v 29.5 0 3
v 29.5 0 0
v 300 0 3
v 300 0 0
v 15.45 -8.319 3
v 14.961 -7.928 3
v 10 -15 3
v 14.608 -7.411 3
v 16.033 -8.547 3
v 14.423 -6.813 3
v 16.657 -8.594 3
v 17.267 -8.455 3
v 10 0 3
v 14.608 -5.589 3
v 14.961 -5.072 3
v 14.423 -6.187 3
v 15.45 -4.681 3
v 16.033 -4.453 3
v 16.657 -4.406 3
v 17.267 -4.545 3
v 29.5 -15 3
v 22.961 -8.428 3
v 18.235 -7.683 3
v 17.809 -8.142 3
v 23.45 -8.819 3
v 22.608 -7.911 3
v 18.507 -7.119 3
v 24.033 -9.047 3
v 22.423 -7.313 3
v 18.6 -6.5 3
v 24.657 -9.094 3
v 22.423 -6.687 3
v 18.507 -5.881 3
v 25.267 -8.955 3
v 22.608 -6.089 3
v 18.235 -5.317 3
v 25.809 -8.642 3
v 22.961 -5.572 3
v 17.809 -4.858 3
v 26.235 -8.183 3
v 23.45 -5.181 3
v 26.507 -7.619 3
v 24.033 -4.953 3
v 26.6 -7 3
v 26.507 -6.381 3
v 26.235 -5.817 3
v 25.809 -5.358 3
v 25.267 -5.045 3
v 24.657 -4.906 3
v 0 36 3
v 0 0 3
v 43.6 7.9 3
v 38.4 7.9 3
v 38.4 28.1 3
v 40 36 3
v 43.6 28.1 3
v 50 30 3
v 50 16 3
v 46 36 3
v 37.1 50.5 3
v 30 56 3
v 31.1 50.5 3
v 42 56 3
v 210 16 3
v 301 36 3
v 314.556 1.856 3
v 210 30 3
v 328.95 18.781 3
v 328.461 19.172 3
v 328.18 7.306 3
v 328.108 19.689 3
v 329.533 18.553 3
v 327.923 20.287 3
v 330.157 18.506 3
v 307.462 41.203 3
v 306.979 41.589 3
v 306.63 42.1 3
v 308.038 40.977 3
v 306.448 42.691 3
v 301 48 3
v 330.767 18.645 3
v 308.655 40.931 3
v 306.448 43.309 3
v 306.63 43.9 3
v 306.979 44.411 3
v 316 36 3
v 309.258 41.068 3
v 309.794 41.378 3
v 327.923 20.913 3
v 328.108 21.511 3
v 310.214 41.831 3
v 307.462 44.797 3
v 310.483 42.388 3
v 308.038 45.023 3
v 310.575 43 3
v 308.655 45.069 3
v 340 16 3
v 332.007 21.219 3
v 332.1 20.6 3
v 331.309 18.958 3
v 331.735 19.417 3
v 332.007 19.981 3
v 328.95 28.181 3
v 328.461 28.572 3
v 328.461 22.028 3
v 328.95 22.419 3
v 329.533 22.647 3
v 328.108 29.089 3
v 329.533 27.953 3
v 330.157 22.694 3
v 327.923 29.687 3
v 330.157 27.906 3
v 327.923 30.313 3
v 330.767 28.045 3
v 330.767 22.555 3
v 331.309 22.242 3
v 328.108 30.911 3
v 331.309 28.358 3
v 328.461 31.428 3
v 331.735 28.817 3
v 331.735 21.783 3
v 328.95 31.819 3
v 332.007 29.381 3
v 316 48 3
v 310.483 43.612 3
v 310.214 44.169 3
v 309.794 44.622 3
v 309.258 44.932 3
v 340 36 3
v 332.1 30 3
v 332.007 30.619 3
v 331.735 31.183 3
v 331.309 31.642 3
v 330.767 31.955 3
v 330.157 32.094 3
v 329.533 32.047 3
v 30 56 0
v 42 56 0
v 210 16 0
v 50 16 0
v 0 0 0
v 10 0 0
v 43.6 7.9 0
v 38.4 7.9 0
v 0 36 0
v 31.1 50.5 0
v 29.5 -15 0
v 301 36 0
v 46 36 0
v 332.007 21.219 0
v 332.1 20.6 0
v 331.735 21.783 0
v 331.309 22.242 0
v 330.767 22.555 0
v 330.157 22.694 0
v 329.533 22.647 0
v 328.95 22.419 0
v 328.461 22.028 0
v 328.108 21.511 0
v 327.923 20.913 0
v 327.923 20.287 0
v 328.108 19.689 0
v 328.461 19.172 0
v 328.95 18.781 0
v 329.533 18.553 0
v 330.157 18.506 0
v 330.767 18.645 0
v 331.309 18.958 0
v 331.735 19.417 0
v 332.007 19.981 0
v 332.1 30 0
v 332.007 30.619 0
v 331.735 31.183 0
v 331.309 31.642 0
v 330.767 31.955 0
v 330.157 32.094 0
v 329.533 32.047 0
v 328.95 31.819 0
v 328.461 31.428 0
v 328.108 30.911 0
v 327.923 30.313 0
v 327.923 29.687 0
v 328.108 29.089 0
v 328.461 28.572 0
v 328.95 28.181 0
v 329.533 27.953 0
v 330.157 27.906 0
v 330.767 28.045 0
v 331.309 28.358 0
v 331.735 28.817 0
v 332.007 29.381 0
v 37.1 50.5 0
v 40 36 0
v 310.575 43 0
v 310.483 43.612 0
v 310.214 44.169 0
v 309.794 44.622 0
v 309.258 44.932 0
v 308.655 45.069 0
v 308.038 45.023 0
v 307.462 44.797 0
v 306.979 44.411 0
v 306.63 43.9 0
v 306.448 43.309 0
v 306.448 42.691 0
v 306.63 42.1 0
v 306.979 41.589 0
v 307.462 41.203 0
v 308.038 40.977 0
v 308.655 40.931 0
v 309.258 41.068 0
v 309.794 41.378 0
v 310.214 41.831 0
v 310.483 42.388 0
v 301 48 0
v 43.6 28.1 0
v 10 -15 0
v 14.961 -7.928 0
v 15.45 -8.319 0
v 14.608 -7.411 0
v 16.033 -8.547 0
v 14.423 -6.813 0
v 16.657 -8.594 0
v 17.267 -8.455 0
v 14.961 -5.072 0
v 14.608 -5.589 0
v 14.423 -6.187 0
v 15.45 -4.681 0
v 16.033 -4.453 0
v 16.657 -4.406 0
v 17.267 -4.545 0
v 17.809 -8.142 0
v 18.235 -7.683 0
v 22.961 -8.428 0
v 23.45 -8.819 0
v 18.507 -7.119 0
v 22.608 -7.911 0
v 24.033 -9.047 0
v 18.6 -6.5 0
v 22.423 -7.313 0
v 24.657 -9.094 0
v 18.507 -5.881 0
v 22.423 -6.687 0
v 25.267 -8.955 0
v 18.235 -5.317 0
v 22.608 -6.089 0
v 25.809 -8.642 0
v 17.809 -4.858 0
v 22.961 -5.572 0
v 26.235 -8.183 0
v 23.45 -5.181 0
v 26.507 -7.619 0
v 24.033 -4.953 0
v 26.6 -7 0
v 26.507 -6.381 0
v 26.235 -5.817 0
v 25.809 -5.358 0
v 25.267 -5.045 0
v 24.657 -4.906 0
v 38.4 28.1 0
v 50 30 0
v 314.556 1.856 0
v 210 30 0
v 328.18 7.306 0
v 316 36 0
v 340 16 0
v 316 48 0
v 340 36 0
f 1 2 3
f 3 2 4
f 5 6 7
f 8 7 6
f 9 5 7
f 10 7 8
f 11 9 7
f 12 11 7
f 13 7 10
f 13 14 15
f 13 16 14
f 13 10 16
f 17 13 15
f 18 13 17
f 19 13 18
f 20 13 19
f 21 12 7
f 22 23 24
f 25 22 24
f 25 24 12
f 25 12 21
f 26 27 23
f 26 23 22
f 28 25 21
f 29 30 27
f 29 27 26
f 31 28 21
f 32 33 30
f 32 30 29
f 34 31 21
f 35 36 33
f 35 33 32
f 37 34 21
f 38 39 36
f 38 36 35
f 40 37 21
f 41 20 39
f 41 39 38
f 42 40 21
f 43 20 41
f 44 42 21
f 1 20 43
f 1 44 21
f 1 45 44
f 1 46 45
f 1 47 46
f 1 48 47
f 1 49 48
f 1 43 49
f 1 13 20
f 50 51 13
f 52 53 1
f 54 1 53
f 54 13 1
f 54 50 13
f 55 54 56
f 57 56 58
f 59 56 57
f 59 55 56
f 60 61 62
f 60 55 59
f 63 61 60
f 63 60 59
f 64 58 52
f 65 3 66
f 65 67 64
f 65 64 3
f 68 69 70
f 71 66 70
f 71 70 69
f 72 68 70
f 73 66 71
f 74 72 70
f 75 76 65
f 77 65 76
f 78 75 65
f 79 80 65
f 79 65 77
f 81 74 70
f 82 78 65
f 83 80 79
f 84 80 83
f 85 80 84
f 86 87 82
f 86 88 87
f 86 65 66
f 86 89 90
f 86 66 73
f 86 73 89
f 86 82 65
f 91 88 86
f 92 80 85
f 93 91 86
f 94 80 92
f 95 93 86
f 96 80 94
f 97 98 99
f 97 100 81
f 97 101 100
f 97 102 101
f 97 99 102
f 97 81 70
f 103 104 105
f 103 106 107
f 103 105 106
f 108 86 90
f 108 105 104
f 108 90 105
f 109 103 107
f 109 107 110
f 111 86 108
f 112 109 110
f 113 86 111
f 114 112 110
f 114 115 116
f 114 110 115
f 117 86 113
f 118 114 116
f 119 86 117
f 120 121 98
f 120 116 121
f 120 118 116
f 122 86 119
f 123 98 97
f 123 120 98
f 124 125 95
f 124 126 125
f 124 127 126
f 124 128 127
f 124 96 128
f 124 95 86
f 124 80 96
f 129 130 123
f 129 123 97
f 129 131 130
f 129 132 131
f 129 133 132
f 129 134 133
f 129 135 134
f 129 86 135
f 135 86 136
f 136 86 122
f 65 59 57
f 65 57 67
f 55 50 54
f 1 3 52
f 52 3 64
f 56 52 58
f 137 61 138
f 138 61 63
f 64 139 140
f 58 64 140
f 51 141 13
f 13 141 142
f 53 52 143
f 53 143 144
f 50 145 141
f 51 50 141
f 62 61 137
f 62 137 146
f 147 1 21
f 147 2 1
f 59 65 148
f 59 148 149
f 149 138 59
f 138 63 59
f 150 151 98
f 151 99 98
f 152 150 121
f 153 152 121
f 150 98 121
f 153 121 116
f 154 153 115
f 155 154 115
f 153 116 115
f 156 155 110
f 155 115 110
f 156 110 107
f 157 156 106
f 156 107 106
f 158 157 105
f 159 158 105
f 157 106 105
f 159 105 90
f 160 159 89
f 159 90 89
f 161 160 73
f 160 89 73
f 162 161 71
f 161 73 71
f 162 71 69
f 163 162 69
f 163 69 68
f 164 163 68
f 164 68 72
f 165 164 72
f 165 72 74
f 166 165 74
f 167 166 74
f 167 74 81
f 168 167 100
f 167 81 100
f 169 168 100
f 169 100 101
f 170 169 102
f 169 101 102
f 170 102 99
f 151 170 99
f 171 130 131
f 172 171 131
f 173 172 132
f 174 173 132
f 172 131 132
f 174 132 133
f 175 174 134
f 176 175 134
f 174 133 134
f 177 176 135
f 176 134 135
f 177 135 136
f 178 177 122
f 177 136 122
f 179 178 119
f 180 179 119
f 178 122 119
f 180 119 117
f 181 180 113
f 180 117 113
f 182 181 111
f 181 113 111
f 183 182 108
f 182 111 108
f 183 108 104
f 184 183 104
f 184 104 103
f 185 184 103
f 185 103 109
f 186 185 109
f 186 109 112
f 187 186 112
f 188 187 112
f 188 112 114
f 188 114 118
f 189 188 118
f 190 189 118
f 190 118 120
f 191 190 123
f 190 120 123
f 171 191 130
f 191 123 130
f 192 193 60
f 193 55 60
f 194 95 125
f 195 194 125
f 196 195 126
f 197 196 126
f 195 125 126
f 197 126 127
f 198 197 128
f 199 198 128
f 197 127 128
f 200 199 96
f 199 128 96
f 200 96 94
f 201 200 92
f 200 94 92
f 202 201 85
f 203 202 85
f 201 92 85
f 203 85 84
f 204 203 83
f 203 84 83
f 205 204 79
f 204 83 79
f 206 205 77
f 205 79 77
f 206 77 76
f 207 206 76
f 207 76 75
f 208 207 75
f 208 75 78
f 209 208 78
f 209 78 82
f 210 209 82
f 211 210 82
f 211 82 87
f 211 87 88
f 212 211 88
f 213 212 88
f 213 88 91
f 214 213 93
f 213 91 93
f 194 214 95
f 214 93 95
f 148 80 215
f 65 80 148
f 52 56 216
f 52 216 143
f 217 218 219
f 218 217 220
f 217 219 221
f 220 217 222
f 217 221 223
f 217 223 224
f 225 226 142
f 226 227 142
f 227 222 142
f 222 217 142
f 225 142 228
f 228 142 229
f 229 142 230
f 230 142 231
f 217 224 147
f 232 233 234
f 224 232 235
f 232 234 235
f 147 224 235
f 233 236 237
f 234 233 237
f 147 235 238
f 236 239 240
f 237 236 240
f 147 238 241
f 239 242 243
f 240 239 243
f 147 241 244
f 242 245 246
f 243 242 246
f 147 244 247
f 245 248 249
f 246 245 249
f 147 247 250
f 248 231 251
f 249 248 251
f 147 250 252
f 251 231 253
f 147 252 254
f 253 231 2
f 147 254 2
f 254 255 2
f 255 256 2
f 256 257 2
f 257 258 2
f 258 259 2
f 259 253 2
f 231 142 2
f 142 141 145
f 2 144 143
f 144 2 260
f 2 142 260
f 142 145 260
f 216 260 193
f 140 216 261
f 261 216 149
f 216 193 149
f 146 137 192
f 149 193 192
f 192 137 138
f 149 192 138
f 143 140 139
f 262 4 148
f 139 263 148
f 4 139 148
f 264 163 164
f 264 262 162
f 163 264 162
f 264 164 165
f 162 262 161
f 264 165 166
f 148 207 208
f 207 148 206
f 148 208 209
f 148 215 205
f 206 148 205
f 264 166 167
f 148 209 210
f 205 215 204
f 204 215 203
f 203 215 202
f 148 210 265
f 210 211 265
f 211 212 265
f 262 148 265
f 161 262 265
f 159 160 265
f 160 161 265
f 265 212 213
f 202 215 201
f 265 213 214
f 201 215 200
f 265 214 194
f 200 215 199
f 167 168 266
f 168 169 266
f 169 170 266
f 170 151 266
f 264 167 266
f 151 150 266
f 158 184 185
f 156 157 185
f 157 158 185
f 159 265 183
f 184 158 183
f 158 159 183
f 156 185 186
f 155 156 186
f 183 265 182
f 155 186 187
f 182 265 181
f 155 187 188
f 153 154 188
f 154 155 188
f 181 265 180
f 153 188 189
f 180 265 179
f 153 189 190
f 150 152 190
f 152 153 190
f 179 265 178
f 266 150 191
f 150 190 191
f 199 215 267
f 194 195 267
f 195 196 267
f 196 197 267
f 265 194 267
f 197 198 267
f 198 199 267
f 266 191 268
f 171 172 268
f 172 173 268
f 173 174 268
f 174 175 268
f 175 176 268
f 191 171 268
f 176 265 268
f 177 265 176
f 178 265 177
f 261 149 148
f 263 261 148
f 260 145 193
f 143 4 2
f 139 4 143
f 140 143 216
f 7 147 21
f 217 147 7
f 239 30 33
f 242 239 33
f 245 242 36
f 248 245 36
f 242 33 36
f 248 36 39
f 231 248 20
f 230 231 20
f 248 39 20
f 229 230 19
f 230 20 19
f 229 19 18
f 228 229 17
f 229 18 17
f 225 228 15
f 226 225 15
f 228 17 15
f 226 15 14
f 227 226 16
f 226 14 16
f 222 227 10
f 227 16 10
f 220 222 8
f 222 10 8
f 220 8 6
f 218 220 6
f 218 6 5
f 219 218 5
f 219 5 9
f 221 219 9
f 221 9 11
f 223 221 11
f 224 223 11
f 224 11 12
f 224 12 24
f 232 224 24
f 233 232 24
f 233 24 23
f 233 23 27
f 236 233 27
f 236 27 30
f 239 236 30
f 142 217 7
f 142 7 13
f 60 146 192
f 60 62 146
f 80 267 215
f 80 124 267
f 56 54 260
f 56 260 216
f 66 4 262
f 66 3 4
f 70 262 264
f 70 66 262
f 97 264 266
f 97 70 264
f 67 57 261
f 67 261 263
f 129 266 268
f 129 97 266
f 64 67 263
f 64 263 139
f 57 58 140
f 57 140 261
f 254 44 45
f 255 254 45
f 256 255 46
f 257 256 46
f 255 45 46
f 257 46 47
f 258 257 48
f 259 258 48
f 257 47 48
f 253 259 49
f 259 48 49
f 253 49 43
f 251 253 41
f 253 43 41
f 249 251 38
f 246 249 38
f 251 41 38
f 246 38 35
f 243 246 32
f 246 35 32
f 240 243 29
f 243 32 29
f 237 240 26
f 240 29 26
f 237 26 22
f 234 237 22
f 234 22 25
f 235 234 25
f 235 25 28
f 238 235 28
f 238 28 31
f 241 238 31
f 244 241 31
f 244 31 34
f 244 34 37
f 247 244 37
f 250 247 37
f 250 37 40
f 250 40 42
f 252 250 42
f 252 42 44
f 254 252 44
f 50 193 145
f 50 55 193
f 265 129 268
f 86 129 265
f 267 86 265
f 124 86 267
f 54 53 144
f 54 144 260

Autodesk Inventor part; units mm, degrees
ref_plane "YZ Plane" through (0, 0, 0) normal (1, 0, 0) x (0, 1, 0)
ref_plane "XZ Plane" through (0, 0, 0) normal (0, 1, 0) x (-1, 0, 0)
ref_plane "XY Plane" through (0, 0, 0) normal (0, 0, 1) x (1, 0, 0)
sketch "Sketch1" plane through (0, 0, 0) normal (0, 0, 1) x (1, 0, 0)
  line L0 (0, 0) -> (300, 0)
  line L1 (300, 0) -> (300, 16)
  line L2 (300, 16) -> (0, 16)
  line L3 (0, 16) -> (0, 0)
  line L4 (0, 0) -> (22.0483, 0)
  line L5 (10, 0) -> (29.5, 0)
  line L6 (29.5, 0) -> (29.5, -15)
  line L7 (29.5, -15) -> (10, -15)
  line L8 (10, -15) -> (10, 0)
  point P0 (0, 8)
  dimension "d2" = 19.5
  dimension "d3" = 15
  dimension "d4" = 10
  dimension "d5" = 16
  dimension "d8" = 300
extrude "Extrusion1" add sketch "Sketch1" along normal blind 3
sketch "Sketch2" plane through (0, 0, 3) normal (0, 0, 1) x (1, 0, 0)
  line L0 (0, 16) -> (0, 0) projected
  line L1 (0, 16) -> (0, 36)
  line L2 (300, 0) -> (300, 16) projected
  line L3 (340, 16) -> (340, 36)
  line L4 (340, 36) -> (0, 36)
  line L5 (300, 16) -> (0, 16) projected
  line L6 (50, 16) -> (50, 30)
  line L7 (50, 30) -> (210, 30)
  line L8 (210, 30) -> (210, 16)
  line L9 (40, 36) -> (36, 56)
  line L10 (36, 56) -> (42, 56)
  line L11 (42, 56) -> (46, 36)
  circle A0 centre (330, 30) radius 2.1
  circle A1 centre (330, 20.6) radius 2.1
  line L12 (340, 16) -> (300, 16)
  line L13 (301, 36) -> (316, 36)
  line L14 (316, 36) -> (316, 48)
  line L15 (316, 48) -> (301, 48)
  line L16 (301, 48) -> (301, 36)
  circle A2 centre (308.5, 43) radius 2.075
  line L17 (36, 56) -> (30, 56)
  line L18 (30, 56) -> (31.1, 50.5)
  line L19 (31.1, 50.5) -> (37.1, 50.5)
  point P0 (308.5, 48)
  point P1 (316, 36)
  dimension "d44" = 20
  dimension "d45" = 160
  dimension "d46" = 50
  dimension "d47" = 14
  dimension "d48" = 20
  dimension "d49" = 6
  dimension "d50" = 4
  dimension "d51" = 40
  dimension "d83" = 4.2
  dimension "d84" = 4.2
  dimension "d85" = 6
  dimension "d86" = 9.4
  dimension "d87" = 10
  dimension "d99" = 40
  dimension "d107" = 7
  dimension "d108" = 15
  dimension "d109" = 12
  dimension "d110" = 24
  dimension "d111" = 4.15
  dimension "d112" = 6
  dimension "d114" = 5.5
extrude "Extrusion2" add sketch "Sketch2" against normal blind 3 contours L1 L4 L3 L12 L5 L8 L7 L6 | L9 L10 L11 L4 | L19 L18 L17 L9 | L16 L15 L14 L4
sketch "Sketch3" plane through (0, 0, 3) normal (0, 0, 1) x (1, 0, 0)
  circle A0 centre (16.5, -6.5) radius 2.1
  circle A1 centre (24.5, -7) radius 2.1
  line L0 (29.5, 0) -> (300, 0) projected
  line L1 (29.5, -15) -> (29.5, 0) projected
  point P0 (0, 0)
  dimension "d75" = 4.2
  dimension "d76" = 6.5
  dimension "d77" = 4.2
  dimension "d78" = 7
  dimension "d79" = 5
  dimension "d80" = 8
extrude "Extrusion3" cut sketch "Sketch3" against normal blind 3
sketch "Sketch4" plane through (0, 0, 3) normal (0, 0, 1) x (1, 0, 0)
  line L0 (29.5, 0) -> (300, 0) projected
  circle A0 centre (41, 18) radius 2.6
  line L1 (340, 36) -> (46, 36) projected
  line L2 (38.4, 28.1) -> (43.6, 28.1)
  line L3 (43.6, 28.1) -> (43.6, 7.9)
  line L4 (43.6, 7.9) -> (38.4, 7.9)
  line L5 (38.4, 7.9) -> (38.4, 28.1)
  line L6 (38.4, 28.1) -> (43.6, 7.9) construction
  line L7 (43.6, 28.1) -> (38.4, 7.9) construction
  point P0 (0, 0)
  point P1 (43.6, 18)
  point P2 (38.4, 18)
  dimension "d95" = 18
  dimension "d96" = 5.2
  dimension "d100" = 5
  dimension "d101" = 20.2
extrude "Extrusion4" cut sketch "Sketch4" against normal blind 3
sketch "Sketch5" plane through (0, 0, 3) normal (0, 0, 1) x (1, 0, 0)
  line L0 (29.5, 0) -> (300, 0) projected
  line L1 (340, 36) -> (340, 16) projected
  arc A0 (300, 0) -> (340, 16) centre (300, 58) ccw
  line L2 (300, 0) -> (300, 16) projected
  line L3 (300, 0) -> (300, 16)
  line L4 (300, 16) -> (340, 16)
  point P0 (0, 0)
extrude "Extrusion5" add sketch "Sketch5" against normal blind 3
properties part number "Middle_bar"
